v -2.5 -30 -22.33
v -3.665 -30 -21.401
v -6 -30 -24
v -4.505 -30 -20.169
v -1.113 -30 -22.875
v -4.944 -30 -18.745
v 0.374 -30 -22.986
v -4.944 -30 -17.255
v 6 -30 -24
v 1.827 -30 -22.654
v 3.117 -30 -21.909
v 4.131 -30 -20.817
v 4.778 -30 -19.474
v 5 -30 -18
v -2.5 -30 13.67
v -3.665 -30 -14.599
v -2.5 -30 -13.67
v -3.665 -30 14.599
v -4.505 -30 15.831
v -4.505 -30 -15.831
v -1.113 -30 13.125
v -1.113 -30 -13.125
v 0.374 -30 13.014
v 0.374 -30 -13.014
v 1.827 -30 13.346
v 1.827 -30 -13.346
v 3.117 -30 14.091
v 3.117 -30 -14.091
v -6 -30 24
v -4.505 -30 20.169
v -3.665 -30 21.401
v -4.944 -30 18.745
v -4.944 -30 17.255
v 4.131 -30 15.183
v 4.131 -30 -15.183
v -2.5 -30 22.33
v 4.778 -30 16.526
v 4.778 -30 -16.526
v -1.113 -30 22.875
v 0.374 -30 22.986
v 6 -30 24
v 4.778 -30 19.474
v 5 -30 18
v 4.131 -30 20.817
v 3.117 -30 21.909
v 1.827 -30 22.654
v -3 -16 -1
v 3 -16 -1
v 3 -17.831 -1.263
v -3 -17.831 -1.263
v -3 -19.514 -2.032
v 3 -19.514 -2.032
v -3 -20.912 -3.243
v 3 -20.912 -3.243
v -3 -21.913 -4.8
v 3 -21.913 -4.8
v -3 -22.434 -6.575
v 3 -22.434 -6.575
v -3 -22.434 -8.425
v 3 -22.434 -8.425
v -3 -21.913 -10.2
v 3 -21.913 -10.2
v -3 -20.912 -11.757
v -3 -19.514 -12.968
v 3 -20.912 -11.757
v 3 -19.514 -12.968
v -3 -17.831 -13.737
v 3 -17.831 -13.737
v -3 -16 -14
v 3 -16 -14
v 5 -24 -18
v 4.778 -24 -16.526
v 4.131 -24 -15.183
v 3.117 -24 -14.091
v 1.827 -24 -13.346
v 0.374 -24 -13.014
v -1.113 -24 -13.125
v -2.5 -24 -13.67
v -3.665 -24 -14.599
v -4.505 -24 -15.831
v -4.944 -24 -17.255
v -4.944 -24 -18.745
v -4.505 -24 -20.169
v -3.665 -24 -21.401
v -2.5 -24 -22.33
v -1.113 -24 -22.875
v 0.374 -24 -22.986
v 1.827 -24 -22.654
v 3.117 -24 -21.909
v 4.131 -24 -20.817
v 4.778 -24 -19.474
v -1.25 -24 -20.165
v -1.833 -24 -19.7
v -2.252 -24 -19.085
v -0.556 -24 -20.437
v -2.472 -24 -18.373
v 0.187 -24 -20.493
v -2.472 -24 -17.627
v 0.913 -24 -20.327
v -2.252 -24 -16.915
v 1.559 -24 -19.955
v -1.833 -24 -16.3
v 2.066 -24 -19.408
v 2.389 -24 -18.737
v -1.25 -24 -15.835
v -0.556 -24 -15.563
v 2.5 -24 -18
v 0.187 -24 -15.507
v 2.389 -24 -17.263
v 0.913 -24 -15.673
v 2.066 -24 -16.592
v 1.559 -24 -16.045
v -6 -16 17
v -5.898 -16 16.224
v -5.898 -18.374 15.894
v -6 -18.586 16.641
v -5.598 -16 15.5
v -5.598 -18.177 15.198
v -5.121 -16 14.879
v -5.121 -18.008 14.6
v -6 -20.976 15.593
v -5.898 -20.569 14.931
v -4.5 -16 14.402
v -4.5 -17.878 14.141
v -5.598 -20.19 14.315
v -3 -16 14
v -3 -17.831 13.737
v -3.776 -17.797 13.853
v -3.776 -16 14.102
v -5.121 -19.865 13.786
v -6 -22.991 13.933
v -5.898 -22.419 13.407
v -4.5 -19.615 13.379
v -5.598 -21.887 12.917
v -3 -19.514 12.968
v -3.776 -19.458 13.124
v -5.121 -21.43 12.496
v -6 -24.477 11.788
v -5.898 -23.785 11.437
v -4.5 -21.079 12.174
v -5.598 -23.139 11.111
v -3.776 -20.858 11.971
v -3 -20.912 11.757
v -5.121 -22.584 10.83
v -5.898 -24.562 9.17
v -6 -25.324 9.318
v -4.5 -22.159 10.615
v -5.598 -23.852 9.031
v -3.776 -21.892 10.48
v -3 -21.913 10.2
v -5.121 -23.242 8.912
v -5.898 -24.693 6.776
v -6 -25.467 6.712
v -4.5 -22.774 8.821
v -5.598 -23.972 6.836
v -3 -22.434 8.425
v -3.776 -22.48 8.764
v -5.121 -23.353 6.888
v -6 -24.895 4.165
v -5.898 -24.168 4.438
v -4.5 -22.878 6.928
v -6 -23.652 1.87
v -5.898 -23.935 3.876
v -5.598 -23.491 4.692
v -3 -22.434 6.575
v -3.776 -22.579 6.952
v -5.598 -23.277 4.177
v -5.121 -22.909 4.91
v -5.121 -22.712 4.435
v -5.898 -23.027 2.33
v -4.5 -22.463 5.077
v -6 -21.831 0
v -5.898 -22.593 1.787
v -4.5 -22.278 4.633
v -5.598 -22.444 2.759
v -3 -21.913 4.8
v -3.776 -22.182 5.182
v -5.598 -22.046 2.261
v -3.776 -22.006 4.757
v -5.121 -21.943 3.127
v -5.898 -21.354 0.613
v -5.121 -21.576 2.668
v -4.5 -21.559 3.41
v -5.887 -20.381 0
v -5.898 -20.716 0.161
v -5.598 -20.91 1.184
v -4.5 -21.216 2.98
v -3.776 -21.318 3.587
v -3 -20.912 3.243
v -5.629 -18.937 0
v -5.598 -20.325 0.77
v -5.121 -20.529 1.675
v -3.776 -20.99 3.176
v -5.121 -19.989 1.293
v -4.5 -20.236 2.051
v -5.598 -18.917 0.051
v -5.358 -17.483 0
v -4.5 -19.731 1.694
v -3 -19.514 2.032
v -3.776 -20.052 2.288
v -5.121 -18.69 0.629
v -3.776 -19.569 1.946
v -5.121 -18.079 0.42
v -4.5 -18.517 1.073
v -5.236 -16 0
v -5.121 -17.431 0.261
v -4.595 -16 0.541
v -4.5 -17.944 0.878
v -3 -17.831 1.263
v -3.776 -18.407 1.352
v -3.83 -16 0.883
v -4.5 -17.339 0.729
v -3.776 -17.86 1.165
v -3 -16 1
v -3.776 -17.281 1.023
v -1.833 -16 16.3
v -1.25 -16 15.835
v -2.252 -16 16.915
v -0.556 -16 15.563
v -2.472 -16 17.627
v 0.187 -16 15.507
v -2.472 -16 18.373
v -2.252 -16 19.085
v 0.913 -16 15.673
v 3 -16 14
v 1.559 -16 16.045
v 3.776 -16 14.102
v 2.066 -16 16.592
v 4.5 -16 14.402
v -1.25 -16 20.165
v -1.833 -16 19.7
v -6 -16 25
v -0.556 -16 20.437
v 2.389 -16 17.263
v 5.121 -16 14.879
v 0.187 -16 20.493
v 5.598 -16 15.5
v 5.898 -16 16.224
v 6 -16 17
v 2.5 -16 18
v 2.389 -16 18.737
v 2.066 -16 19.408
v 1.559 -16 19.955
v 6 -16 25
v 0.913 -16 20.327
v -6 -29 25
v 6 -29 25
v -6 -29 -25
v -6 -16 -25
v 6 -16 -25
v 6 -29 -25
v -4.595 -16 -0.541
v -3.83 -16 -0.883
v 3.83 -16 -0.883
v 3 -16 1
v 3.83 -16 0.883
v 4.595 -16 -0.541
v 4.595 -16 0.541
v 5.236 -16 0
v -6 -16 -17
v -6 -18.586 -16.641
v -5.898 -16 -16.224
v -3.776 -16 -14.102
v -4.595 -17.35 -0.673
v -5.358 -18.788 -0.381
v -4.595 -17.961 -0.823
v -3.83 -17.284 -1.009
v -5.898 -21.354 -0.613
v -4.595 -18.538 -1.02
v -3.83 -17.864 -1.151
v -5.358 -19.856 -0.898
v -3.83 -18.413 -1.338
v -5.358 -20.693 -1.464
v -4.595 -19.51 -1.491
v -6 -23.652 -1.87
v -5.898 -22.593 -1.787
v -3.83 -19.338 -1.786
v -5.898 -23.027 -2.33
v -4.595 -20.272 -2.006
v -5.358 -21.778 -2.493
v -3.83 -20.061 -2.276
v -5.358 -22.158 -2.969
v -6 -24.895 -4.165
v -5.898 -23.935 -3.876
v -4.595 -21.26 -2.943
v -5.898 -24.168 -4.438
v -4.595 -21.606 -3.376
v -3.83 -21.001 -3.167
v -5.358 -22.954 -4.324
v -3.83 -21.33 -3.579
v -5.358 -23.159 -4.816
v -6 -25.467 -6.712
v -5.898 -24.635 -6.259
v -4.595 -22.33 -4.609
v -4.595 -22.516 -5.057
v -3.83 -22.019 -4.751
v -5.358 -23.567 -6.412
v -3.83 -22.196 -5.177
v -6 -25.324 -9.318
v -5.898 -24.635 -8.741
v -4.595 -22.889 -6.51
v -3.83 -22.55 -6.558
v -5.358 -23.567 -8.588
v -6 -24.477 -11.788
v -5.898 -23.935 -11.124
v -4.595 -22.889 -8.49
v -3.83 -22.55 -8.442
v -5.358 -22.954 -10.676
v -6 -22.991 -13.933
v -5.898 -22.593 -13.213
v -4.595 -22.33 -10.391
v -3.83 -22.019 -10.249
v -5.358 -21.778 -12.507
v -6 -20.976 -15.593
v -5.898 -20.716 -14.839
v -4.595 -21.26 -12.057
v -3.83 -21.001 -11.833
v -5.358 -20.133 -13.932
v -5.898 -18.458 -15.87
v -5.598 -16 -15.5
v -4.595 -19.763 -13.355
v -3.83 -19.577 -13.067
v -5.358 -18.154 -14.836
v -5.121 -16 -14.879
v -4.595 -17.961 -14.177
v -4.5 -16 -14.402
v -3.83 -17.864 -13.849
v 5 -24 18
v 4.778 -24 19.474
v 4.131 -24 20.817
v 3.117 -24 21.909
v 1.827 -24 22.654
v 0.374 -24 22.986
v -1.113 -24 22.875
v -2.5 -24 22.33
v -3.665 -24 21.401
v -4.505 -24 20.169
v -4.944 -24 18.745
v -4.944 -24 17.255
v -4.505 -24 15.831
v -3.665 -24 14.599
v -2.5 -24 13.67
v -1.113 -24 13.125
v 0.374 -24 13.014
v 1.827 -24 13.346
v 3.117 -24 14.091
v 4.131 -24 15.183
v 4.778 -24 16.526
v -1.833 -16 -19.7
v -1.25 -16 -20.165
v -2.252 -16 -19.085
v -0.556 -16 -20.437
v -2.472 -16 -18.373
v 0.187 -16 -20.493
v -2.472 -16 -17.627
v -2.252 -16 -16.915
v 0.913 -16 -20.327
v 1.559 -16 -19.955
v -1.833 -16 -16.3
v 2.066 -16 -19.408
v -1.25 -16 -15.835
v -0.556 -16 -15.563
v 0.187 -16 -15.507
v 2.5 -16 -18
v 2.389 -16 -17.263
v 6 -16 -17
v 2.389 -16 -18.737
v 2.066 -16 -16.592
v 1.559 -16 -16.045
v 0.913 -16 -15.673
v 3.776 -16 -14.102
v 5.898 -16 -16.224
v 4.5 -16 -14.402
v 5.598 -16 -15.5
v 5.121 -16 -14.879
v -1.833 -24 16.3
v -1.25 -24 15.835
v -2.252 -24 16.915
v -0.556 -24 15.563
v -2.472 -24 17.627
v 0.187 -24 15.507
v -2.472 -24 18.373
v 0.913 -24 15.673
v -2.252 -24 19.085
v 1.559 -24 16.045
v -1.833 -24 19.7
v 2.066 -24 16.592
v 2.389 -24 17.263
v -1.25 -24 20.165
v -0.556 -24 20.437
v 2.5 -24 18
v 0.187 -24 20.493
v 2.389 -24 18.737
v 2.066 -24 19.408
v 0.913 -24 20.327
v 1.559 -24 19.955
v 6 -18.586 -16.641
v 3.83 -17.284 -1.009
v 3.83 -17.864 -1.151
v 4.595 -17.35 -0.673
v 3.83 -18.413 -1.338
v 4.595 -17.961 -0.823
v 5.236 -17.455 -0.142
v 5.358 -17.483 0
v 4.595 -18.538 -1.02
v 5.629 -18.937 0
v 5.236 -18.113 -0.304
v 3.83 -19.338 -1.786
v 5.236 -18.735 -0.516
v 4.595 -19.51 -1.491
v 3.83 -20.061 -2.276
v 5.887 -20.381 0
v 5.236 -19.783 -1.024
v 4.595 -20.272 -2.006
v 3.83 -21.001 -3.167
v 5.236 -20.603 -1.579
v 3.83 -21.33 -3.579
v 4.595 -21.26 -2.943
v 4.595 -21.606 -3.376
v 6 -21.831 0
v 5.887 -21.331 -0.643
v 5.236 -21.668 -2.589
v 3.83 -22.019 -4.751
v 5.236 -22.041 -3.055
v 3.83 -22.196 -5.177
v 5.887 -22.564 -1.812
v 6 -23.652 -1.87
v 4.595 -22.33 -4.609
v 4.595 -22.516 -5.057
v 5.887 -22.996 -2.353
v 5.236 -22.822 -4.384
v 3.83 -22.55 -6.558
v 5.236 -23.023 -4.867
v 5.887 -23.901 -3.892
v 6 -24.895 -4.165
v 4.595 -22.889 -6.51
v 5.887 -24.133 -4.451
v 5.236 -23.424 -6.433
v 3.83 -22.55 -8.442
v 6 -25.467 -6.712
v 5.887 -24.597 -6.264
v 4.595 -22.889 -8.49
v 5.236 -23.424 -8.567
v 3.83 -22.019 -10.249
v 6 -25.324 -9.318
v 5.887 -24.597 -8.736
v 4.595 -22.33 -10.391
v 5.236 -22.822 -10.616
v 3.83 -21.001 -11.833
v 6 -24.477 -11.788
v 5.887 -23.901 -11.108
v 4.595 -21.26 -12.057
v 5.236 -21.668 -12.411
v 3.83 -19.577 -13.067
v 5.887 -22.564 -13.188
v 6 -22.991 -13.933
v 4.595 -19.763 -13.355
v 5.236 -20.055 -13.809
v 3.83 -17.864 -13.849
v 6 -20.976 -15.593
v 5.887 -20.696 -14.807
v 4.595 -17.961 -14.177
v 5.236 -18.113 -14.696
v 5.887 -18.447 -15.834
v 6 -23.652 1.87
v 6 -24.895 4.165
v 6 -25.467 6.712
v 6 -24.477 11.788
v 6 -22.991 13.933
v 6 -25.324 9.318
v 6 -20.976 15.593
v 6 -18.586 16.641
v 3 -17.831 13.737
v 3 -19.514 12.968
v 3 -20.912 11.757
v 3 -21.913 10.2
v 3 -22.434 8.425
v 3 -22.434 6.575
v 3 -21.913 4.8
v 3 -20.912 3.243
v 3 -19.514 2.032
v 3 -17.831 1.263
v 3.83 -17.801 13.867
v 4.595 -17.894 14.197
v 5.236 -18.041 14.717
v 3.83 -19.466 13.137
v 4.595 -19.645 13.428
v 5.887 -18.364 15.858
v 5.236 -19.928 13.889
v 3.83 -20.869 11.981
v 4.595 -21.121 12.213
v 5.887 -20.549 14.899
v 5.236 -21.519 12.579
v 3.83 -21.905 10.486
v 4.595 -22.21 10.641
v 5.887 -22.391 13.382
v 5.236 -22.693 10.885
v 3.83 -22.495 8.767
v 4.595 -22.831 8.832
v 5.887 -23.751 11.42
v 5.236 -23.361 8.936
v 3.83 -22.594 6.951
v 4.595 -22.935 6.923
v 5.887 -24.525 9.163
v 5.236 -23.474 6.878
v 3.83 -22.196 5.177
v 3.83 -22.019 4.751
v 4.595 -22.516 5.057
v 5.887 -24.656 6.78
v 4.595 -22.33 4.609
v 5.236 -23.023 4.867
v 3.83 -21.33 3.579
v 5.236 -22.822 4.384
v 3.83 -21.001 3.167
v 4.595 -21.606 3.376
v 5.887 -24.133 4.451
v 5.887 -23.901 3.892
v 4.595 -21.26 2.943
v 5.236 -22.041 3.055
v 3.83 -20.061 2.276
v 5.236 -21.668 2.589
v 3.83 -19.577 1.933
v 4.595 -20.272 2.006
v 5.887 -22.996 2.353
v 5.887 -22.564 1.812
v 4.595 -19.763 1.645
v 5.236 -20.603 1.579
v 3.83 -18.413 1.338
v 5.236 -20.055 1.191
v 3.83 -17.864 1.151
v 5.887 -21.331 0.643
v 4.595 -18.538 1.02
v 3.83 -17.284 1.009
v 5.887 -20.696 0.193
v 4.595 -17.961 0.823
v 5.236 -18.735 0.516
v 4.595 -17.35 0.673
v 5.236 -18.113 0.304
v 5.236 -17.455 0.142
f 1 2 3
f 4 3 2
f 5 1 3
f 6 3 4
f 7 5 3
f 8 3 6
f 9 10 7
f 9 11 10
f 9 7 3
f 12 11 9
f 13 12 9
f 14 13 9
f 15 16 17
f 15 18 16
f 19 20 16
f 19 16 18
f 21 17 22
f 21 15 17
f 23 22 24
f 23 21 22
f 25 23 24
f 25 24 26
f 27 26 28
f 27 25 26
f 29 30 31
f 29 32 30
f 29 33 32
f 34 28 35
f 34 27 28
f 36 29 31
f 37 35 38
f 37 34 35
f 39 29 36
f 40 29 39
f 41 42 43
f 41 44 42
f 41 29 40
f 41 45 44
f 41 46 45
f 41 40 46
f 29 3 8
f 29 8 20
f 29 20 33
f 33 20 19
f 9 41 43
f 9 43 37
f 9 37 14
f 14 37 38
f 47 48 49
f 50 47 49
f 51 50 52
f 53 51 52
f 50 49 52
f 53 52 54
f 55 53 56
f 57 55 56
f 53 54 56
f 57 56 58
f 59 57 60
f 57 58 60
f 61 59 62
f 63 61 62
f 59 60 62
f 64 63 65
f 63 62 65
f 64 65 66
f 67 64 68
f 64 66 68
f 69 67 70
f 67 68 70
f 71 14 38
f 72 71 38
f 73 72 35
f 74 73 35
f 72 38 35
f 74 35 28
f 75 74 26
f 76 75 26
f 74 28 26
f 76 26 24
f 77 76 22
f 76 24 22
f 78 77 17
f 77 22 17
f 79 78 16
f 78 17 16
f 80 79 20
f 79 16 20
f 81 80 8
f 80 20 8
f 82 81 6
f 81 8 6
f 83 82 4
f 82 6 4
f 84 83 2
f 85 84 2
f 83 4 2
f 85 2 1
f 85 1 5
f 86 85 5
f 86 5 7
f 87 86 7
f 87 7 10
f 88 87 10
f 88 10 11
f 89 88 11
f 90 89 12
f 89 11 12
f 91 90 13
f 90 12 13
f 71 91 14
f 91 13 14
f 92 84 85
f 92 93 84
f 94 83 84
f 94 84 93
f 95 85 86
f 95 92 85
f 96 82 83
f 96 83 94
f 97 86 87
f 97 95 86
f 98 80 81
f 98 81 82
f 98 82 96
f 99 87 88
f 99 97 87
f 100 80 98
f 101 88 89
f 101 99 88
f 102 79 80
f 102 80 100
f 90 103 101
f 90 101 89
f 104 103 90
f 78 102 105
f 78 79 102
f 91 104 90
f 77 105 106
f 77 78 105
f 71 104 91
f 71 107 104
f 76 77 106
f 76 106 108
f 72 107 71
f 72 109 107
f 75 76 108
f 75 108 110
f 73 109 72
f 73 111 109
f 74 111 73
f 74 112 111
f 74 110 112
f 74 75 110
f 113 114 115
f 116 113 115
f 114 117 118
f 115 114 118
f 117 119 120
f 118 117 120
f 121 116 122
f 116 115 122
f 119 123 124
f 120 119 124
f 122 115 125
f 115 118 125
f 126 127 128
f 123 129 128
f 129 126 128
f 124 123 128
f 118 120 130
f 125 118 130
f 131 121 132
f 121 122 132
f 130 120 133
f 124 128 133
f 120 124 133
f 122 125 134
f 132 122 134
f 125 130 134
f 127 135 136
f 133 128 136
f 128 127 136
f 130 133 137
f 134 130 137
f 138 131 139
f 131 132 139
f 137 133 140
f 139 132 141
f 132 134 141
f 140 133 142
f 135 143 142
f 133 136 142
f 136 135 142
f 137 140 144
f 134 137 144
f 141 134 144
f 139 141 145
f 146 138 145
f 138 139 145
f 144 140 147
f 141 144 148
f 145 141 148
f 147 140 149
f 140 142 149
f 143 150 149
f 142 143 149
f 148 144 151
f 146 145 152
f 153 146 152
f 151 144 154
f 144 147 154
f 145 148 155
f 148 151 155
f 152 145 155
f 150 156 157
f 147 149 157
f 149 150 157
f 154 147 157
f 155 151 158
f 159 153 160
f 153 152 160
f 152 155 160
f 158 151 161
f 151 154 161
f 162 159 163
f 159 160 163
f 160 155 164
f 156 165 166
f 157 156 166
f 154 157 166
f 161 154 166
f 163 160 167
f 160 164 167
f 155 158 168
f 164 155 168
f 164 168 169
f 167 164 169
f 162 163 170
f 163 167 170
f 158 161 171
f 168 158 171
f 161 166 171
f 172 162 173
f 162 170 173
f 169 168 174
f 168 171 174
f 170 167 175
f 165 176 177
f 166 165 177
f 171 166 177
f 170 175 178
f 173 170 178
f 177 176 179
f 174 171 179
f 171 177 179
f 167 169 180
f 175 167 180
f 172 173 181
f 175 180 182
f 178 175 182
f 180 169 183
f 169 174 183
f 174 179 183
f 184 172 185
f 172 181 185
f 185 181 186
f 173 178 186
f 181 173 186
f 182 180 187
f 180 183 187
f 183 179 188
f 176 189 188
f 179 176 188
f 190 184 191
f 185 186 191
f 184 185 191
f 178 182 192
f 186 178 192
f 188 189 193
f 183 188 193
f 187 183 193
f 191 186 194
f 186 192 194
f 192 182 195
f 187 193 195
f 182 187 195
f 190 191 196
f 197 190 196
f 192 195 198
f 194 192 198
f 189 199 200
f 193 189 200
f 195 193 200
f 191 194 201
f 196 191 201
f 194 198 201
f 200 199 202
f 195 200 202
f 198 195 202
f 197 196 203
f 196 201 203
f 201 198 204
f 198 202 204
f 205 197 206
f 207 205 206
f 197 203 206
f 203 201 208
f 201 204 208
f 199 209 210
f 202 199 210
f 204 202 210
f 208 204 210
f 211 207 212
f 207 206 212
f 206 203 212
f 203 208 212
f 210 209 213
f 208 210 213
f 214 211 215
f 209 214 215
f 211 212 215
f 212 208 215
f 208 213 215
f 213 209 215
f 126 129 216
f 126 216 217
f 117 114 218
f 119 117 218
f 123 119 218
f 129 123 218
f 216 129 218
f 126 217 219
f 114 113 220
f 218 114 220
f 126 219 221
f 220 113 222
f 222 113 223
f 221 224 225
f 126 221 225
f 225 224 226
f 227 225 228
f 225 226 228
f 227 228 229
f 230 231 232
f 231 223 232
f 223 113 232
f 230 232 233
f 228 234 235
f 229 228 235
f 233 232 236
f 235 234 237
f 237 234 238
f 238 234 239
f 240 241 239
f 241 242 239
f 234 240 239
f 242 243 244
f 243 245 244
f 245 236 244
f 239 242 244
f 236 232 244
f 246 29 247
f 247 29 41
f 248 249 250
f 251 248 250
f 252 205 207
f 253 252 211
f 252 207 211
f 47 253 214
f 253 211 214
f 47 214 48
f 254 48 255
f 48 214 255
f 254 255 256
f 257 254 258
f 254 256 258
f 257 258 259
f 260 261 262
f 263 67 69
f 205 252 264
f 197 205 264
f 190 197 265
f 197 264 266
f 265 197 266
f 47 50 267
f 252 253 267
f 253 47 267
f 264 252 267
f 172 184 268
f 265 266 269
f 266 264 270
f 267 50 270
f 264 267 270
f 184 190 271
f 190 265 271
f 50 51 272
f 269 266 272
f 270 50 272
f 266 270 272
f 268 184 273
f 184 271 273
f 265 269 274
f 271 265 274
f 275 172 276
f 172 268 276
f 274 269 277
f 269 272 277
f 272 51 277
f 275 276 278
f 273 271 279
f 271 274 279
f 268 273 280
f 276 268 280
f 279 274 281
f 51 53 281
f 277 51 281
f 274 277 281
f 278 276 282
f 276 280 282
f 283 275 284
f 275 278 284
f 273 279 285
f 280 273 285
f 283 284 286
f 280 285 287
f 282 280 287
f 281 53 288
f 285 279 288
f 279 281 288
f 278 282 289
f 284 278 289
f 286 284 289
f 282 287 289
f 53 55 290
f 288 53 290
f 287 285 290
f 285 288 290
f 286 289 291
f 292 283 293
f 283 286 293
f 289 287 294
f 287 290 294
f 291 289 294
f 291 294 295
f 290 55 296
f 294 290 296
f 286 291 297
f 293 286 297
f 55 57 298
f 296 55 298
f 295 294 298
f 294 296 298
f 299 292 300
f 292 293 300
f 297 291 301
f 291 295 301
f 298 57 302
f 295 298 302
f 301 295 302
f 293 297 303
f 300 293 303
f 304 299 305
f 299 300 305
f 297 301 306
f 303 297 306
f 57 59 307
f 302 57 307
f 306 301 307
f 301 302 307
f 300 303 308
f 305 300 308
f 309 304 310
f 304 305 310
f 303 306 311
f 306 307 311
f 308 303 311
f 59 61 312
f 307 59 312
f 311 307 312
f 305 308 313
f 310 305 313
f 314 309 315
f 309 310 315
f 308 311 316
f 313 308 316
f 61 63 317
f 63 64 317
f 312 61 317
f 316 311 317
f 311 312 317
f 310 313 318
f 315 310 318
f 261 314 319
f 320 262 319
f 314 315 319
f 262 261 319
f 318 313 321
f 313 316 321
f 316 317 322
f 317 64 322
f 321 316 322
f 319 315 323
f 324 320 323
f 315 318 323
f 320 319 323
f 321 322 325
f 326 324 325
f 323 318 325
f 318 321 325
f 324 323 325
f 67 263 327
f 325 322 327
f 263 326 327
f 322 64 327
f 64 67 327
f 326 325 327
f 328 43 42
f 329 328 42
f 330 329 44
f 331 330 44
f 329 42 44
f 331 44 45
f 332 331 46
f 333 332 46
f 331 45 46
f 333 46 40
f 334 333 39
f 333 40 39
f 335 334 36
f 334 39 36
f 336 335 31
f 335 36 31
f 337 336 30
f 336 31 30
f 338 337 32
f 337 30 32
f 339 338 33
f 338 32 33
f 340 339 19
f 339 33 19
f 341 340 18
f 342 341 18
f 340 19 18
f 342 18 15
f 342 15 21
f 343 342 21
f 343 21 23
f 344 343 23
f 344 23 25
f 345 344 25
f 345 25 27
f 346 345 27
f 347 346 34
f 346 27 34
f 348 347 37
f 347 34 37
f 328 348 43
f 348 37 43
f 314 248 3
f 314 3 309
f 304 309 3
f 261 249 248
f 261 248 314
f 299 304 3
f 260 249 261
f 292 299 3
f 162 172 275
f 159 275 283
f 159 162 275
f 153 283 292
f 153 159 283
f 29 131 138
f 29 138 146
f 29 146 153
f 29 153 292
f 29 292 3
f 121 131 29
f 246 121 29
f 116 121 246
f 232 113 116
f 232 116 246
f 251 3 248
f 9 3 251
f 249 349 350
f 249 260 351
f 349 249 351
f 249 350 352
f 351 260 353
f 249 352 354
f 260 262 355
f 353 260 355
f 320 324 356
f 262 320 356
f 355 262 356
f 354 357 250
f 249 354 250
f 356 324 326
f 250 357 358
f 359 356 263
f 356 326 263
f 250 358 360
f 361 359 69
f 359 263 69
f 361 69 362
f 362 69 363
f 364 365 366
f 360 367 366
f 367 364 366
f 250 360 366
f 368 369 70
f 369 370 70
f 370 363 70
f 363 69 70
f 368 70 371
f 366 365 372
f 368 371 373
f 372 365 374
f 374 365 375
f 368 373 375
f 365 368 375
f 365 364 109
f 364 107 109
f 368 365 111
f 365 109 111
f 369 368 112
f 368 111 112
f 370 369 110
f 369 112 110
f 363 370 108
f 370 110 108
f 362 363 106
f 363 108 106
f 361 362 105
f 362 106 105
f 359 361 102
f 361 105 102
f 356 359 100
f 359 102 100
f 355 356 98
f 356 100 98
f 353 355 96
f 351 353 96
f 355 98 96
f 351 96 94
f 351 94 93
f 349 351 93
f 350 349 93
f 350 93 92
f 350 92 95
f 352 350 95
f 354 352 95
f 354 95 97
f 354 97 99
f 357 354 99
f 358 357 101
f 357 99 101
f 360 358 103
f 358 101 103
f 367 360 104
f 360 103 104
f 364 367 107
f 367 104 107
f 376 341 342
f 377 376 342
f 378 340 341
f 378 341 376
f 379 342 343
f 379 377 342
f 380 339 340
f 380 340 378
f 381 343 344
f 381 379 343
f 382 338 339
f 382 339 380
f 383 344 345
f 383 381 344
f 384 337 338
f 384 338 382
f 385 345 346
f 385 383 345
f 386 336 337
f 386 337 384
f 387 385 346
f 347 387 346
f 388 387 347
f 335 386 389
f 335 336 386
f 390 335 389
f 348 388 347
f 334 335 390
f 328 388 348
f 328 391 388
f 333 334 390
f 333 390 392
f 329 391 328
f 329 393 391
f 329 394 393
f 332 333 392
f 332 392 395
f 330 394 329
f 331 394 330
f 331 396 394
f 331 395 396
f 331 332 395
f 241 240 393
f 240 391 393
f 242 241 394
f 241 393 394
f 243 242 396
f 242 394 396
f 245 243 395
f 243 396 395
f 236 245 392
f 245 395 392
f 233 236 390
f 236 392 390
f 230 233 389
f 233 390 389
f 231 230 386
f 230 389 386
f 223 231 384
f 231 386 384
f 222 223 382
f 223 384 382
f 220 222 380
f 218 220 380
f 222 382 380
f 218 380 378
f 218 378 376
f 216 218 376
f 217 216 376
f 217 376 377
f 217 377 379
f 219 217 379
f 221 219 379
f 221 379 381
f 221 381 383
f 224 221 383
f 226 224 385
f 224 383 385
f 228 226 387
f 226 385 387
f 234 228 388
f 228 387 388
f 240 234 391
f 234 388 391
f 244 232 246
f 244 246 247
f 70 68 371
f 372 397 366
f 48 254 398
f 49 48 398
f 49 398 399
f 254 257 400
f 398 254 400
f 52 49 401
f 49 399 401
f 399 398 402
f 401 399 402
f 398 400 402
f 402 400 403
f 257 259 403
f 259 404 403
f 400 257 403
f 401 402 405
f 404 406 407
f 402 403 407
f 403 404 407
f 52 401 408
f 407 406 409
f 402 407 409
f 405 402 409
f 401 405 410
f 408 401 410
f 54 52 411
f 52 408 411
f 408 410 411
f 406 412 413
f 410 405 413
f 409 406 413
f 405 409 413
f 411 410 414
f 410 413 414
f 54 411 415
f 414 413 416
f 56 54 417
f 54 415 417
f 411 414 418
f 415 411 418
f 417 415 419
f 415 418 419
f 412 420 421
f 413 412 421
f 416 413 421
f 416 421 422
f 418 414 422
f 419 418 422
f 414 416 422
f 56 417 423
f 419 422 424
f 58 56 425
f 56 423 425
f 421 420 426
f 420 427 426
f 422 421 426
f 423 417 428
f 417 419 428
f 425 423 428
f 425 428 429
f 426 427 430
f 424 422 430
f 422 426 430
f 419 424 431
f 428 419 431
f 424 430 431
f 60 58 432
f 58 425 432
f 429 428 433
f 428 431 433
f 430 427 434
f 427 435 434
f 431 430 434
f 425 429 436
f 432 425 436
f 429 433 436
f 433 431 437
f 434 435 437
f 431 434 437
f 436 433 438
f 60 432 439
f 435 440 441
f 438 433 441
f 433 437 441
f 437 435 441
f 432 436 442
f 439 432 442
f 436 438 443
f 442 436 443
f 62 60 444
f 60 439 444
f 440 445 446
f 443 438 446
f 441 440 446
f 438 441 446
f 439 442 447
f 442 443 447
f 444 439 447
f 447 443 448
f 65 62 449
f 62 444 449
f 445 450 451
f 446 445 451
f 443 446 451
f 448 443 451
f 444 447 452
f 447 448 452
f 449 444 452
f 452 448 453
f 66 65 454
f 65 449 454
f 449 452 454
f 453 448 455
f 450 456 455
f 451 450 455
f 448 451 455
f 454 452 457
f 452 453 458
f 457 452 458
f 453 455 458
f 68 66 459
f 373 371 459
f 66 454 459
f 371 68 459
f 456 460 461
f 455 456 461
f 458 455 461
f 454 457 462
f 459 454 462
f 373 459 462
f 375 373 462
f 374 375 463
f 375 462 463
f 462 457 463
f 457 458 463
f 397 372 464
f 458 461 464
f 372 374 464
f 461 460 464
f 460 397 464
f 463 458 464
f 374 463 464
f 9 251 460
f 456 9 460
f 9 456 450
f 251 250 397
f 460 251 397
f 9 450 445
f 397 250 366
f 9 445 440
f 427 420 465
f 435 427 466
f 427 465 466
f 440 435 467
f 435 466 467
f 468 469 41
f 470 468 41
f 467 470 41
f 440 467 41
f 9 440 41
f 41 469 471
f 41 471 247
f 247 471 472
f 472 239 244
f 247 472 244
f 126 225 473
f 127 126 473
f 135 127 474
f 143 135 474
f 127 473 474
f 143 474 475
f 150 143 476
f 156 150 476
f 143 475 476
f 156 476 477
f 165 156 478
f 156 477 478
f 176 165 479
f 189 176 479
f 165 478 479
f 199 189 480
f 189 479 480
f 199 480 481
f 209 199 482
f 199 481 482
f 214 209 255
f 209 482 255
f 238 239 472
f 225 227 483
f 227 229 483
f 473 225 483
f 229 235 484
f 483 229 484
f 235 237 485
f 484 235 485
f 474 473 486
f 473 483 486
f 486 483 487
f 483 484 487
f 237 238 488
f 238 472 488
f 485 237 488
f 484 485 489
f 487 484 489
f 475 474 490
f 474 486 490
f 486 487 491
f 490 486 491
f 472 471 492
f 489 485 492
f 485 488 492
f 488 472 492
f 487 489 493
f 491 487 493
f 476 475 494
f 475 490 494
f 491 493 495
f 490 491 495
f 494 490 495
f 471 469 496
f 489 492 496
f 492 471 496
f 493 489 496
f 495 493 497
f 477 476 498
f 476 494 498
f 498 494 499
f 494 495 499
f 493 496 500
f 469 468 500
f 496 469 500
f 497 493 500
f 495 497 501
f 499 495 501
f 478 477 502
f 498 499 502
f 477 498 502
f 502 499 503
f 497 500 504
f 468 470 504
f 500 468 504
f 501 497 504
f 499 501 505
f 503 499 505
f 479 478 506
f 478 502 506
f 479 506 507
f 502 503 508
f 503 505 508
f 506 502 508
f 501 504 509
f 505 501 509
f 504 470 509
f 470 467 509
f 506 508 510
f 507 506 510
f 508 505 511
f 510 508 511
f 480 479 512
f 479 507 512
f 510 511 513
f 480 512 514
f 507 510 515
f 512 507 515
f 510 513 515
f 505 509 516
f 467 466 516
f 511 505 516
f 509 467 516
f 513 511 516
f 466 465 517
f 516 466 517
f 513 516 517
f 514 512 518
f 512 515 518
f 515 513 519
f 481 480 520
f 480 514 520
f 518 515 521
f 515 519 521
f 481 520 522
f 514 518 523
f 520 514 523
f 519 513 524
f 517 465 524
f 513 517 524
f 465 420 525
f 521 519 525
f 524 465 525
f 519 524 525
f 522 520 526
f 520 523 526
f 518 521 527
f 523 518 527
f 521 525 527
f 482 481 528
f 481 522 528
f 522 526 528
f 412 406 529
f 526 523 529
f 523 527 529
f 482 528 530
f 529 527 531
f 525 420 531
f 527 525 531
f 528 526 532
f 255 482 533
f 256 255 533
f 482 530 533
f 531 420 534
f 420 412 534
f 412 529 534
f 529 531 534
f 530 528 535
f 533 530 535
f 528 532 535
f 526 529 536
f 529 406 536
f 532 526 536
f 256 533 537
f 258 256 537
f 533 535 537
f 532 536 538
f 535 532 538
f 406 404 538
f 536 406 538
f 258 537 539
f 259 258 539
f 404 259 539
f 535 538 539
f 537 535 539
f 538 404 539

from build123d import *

# Parameters (mm, degrees)
F0_W      = 12
F0_H      = 50
F1_DEPTH  = 30
F2_R      = 6.5
F3_DEPTH  = 12.001
F4_W      = 20
F4_H      = 50
F5_DEPTH  = 2
F8_D      = 5
F9_W      = 10
F9_H      = 20
F10_DEPTH = 8
F11_R     = 5
F12_DEPTH = 6
F13_SIZE  = 1
F15_W     = 41.8421067297
F15_H     = 67.5000026822
F16_DEPTH = 25


# Not quite as in the source:
# - a fillet or chamfer that OpenCascade refuses, or shapes differently, is made with other operations: its cross-section is extruded or revolved along the edge and cut away or added


with BuildPart() as f1:
    # F0 (on Front) → F1 (new body)
    with BuildSketch(Plane.XZ):
        Rectangle(F0_W, F0_H)
    extrude(amount=F1_DEPTH)

    # F2 (on face) → F3 (cut, through all)
    with BuildSketch(Plane.YZ.offset(6)):
        with Locations((-16, 7.5)):
            Circle(F2_R)
        with Locations((-16, -7.5)):
            Circle(F2_R)
    extrude(amount=-F3_DEPTH, mode=Mode.SUBTRACT)

    # F4 (on Front) → F5 (join)
    with BuildSketch(Plane.XZ):
        Rectangle(F4_W, F4_H)
    extrude(amount=F5_DEPTH)

    # F6: fillet of radius 3 on 4 edges, made by hand

    # F6_s1 → F6_t2 (revolve, cut)
    with BuildSketch(Plane.XY.offset(7.5)):
        with BuildLine():
            ThreePointArc((-6, -6.5), (-5.1213203436, -8.6213203436), (-3, -9.5))
            Line((-3, -9.5), (-6, -9.5))
            Line((-6, -9.5), (-6, -6.5))
        make_face()
    revolve(axis=Axis((-6, -16, 7.5), (1, 0, 0)), mode=Mode.SUBTRACT)

    # F6_s3 → F6_t4 (revolve, cut)
    with BuildSketch(Plane.XY.offset(-7.5)):
        with BuildLine():
            ThreePointArc((-6, -6.5), (-5.1213203436, -8.6213203436), (-3, -9.5))
            Line((-3, -9.5), (-6, -9.5))
            Line((-6, -9.5), (-6, -6.5))
        make_face()
    revolve(axis=Axis((-6, -16, -7.5), (1, 0, 0)), mode=Mode.SUBTRACT)

    # F6_s5 → F6_t6 (revolve, cut)
    with BuildSketch(Plane.XY.offset(7.5)):
        with BuildLine():
            ThreePointArc((3, -9.5), (5.1213203436, -8.6213203436), (6, -6.5))
            Line((6, -6.5), (6, -9.5))
            Line((6, -9.5), (3, -9.5))
        make_face()
    revolve(axis=Axis((6, -16, 7.5), (1, 0, 0)), mode=Mode.SUBTRACT)

    # F6_s7 → F6_t8 (revolve, cut)
    with BuildSketch(Plane.XY.offset(-7.5)):
        with BuildLine():
            ThreePointArc((3, -9.5), (5.1213203436, -8.6213203436), (6, -6.5))
            Line((6, -6.5), (6, -9.5))
            Line((6, -9.5), (3, -9.5))
        make_face()
    revolve(axis=Axis((6, -16, -7.5), (1, 0, 0)), mode=Mode.SUBTRACT)

    # F8 (through all)
    with Locations(Plane(origin=(0, 0, 0), x_dir=(-1, 0, 0), z_dir=(0, 1, 0))):
        with Locations((0, 18), (0, -18)):
            Hole(F8_D / 2)

    # F9 (on face) → F10 (cut)
    with BuildSketch(Plane(origin=(0, 0, 0), x_dir=(-1, 0, 0), z_dir=(0, 1, 0))):
        Polygon((0, 12.1110272543), (5.1, 15.0555136271), (5.1, 20.9444863729), (0, 23.8889727457), (-5.1, 20.9444863729), (-5.1, 15.0555136271), align=None)
        Rectangle(F9_W, F9_H)
        Polygon((5.1, -20.9444863729), (5.1, -15.0555136271), (0, -12.1110272543), (-5.1, -15.0555136271), (-5.1, -20.9444863729), (0, -23.8889727457), align=None)
    extrude(amount=-F10_DEPTH, mode=Mode.SUBTRACT)

    # F11 (on face) → F12 (cut)
    with BuildSketch(Plane.XZ.offset(30)):
        with Locations((0, 18)):
            Circle(F11_R)
        with Locations((0, -18)):
            Circle(F11_R)
    extrude(amount=-F12_DEPTH, mode=Mode.SUBTRACT)

    # F13
    f13_edges = [f1.edges().sort_by_distance(p)[0] for p in [
        (0, -30, -25),
        (0, -30, 25),
    ]]
    chamfer(f13_edges, length=F13_SIZE)

    # F15 (on offset) → F16 (cut)
    with BuildSketch(Plane.XZ.offset(16)):
        with Locations((-0.493420288, -0.09868294)):
            Rectangle(F15_W, F15_H)
    extrude(amount=-F16_DEPTH, mode=Mode.SUBTRACT)


solid = f1.part
